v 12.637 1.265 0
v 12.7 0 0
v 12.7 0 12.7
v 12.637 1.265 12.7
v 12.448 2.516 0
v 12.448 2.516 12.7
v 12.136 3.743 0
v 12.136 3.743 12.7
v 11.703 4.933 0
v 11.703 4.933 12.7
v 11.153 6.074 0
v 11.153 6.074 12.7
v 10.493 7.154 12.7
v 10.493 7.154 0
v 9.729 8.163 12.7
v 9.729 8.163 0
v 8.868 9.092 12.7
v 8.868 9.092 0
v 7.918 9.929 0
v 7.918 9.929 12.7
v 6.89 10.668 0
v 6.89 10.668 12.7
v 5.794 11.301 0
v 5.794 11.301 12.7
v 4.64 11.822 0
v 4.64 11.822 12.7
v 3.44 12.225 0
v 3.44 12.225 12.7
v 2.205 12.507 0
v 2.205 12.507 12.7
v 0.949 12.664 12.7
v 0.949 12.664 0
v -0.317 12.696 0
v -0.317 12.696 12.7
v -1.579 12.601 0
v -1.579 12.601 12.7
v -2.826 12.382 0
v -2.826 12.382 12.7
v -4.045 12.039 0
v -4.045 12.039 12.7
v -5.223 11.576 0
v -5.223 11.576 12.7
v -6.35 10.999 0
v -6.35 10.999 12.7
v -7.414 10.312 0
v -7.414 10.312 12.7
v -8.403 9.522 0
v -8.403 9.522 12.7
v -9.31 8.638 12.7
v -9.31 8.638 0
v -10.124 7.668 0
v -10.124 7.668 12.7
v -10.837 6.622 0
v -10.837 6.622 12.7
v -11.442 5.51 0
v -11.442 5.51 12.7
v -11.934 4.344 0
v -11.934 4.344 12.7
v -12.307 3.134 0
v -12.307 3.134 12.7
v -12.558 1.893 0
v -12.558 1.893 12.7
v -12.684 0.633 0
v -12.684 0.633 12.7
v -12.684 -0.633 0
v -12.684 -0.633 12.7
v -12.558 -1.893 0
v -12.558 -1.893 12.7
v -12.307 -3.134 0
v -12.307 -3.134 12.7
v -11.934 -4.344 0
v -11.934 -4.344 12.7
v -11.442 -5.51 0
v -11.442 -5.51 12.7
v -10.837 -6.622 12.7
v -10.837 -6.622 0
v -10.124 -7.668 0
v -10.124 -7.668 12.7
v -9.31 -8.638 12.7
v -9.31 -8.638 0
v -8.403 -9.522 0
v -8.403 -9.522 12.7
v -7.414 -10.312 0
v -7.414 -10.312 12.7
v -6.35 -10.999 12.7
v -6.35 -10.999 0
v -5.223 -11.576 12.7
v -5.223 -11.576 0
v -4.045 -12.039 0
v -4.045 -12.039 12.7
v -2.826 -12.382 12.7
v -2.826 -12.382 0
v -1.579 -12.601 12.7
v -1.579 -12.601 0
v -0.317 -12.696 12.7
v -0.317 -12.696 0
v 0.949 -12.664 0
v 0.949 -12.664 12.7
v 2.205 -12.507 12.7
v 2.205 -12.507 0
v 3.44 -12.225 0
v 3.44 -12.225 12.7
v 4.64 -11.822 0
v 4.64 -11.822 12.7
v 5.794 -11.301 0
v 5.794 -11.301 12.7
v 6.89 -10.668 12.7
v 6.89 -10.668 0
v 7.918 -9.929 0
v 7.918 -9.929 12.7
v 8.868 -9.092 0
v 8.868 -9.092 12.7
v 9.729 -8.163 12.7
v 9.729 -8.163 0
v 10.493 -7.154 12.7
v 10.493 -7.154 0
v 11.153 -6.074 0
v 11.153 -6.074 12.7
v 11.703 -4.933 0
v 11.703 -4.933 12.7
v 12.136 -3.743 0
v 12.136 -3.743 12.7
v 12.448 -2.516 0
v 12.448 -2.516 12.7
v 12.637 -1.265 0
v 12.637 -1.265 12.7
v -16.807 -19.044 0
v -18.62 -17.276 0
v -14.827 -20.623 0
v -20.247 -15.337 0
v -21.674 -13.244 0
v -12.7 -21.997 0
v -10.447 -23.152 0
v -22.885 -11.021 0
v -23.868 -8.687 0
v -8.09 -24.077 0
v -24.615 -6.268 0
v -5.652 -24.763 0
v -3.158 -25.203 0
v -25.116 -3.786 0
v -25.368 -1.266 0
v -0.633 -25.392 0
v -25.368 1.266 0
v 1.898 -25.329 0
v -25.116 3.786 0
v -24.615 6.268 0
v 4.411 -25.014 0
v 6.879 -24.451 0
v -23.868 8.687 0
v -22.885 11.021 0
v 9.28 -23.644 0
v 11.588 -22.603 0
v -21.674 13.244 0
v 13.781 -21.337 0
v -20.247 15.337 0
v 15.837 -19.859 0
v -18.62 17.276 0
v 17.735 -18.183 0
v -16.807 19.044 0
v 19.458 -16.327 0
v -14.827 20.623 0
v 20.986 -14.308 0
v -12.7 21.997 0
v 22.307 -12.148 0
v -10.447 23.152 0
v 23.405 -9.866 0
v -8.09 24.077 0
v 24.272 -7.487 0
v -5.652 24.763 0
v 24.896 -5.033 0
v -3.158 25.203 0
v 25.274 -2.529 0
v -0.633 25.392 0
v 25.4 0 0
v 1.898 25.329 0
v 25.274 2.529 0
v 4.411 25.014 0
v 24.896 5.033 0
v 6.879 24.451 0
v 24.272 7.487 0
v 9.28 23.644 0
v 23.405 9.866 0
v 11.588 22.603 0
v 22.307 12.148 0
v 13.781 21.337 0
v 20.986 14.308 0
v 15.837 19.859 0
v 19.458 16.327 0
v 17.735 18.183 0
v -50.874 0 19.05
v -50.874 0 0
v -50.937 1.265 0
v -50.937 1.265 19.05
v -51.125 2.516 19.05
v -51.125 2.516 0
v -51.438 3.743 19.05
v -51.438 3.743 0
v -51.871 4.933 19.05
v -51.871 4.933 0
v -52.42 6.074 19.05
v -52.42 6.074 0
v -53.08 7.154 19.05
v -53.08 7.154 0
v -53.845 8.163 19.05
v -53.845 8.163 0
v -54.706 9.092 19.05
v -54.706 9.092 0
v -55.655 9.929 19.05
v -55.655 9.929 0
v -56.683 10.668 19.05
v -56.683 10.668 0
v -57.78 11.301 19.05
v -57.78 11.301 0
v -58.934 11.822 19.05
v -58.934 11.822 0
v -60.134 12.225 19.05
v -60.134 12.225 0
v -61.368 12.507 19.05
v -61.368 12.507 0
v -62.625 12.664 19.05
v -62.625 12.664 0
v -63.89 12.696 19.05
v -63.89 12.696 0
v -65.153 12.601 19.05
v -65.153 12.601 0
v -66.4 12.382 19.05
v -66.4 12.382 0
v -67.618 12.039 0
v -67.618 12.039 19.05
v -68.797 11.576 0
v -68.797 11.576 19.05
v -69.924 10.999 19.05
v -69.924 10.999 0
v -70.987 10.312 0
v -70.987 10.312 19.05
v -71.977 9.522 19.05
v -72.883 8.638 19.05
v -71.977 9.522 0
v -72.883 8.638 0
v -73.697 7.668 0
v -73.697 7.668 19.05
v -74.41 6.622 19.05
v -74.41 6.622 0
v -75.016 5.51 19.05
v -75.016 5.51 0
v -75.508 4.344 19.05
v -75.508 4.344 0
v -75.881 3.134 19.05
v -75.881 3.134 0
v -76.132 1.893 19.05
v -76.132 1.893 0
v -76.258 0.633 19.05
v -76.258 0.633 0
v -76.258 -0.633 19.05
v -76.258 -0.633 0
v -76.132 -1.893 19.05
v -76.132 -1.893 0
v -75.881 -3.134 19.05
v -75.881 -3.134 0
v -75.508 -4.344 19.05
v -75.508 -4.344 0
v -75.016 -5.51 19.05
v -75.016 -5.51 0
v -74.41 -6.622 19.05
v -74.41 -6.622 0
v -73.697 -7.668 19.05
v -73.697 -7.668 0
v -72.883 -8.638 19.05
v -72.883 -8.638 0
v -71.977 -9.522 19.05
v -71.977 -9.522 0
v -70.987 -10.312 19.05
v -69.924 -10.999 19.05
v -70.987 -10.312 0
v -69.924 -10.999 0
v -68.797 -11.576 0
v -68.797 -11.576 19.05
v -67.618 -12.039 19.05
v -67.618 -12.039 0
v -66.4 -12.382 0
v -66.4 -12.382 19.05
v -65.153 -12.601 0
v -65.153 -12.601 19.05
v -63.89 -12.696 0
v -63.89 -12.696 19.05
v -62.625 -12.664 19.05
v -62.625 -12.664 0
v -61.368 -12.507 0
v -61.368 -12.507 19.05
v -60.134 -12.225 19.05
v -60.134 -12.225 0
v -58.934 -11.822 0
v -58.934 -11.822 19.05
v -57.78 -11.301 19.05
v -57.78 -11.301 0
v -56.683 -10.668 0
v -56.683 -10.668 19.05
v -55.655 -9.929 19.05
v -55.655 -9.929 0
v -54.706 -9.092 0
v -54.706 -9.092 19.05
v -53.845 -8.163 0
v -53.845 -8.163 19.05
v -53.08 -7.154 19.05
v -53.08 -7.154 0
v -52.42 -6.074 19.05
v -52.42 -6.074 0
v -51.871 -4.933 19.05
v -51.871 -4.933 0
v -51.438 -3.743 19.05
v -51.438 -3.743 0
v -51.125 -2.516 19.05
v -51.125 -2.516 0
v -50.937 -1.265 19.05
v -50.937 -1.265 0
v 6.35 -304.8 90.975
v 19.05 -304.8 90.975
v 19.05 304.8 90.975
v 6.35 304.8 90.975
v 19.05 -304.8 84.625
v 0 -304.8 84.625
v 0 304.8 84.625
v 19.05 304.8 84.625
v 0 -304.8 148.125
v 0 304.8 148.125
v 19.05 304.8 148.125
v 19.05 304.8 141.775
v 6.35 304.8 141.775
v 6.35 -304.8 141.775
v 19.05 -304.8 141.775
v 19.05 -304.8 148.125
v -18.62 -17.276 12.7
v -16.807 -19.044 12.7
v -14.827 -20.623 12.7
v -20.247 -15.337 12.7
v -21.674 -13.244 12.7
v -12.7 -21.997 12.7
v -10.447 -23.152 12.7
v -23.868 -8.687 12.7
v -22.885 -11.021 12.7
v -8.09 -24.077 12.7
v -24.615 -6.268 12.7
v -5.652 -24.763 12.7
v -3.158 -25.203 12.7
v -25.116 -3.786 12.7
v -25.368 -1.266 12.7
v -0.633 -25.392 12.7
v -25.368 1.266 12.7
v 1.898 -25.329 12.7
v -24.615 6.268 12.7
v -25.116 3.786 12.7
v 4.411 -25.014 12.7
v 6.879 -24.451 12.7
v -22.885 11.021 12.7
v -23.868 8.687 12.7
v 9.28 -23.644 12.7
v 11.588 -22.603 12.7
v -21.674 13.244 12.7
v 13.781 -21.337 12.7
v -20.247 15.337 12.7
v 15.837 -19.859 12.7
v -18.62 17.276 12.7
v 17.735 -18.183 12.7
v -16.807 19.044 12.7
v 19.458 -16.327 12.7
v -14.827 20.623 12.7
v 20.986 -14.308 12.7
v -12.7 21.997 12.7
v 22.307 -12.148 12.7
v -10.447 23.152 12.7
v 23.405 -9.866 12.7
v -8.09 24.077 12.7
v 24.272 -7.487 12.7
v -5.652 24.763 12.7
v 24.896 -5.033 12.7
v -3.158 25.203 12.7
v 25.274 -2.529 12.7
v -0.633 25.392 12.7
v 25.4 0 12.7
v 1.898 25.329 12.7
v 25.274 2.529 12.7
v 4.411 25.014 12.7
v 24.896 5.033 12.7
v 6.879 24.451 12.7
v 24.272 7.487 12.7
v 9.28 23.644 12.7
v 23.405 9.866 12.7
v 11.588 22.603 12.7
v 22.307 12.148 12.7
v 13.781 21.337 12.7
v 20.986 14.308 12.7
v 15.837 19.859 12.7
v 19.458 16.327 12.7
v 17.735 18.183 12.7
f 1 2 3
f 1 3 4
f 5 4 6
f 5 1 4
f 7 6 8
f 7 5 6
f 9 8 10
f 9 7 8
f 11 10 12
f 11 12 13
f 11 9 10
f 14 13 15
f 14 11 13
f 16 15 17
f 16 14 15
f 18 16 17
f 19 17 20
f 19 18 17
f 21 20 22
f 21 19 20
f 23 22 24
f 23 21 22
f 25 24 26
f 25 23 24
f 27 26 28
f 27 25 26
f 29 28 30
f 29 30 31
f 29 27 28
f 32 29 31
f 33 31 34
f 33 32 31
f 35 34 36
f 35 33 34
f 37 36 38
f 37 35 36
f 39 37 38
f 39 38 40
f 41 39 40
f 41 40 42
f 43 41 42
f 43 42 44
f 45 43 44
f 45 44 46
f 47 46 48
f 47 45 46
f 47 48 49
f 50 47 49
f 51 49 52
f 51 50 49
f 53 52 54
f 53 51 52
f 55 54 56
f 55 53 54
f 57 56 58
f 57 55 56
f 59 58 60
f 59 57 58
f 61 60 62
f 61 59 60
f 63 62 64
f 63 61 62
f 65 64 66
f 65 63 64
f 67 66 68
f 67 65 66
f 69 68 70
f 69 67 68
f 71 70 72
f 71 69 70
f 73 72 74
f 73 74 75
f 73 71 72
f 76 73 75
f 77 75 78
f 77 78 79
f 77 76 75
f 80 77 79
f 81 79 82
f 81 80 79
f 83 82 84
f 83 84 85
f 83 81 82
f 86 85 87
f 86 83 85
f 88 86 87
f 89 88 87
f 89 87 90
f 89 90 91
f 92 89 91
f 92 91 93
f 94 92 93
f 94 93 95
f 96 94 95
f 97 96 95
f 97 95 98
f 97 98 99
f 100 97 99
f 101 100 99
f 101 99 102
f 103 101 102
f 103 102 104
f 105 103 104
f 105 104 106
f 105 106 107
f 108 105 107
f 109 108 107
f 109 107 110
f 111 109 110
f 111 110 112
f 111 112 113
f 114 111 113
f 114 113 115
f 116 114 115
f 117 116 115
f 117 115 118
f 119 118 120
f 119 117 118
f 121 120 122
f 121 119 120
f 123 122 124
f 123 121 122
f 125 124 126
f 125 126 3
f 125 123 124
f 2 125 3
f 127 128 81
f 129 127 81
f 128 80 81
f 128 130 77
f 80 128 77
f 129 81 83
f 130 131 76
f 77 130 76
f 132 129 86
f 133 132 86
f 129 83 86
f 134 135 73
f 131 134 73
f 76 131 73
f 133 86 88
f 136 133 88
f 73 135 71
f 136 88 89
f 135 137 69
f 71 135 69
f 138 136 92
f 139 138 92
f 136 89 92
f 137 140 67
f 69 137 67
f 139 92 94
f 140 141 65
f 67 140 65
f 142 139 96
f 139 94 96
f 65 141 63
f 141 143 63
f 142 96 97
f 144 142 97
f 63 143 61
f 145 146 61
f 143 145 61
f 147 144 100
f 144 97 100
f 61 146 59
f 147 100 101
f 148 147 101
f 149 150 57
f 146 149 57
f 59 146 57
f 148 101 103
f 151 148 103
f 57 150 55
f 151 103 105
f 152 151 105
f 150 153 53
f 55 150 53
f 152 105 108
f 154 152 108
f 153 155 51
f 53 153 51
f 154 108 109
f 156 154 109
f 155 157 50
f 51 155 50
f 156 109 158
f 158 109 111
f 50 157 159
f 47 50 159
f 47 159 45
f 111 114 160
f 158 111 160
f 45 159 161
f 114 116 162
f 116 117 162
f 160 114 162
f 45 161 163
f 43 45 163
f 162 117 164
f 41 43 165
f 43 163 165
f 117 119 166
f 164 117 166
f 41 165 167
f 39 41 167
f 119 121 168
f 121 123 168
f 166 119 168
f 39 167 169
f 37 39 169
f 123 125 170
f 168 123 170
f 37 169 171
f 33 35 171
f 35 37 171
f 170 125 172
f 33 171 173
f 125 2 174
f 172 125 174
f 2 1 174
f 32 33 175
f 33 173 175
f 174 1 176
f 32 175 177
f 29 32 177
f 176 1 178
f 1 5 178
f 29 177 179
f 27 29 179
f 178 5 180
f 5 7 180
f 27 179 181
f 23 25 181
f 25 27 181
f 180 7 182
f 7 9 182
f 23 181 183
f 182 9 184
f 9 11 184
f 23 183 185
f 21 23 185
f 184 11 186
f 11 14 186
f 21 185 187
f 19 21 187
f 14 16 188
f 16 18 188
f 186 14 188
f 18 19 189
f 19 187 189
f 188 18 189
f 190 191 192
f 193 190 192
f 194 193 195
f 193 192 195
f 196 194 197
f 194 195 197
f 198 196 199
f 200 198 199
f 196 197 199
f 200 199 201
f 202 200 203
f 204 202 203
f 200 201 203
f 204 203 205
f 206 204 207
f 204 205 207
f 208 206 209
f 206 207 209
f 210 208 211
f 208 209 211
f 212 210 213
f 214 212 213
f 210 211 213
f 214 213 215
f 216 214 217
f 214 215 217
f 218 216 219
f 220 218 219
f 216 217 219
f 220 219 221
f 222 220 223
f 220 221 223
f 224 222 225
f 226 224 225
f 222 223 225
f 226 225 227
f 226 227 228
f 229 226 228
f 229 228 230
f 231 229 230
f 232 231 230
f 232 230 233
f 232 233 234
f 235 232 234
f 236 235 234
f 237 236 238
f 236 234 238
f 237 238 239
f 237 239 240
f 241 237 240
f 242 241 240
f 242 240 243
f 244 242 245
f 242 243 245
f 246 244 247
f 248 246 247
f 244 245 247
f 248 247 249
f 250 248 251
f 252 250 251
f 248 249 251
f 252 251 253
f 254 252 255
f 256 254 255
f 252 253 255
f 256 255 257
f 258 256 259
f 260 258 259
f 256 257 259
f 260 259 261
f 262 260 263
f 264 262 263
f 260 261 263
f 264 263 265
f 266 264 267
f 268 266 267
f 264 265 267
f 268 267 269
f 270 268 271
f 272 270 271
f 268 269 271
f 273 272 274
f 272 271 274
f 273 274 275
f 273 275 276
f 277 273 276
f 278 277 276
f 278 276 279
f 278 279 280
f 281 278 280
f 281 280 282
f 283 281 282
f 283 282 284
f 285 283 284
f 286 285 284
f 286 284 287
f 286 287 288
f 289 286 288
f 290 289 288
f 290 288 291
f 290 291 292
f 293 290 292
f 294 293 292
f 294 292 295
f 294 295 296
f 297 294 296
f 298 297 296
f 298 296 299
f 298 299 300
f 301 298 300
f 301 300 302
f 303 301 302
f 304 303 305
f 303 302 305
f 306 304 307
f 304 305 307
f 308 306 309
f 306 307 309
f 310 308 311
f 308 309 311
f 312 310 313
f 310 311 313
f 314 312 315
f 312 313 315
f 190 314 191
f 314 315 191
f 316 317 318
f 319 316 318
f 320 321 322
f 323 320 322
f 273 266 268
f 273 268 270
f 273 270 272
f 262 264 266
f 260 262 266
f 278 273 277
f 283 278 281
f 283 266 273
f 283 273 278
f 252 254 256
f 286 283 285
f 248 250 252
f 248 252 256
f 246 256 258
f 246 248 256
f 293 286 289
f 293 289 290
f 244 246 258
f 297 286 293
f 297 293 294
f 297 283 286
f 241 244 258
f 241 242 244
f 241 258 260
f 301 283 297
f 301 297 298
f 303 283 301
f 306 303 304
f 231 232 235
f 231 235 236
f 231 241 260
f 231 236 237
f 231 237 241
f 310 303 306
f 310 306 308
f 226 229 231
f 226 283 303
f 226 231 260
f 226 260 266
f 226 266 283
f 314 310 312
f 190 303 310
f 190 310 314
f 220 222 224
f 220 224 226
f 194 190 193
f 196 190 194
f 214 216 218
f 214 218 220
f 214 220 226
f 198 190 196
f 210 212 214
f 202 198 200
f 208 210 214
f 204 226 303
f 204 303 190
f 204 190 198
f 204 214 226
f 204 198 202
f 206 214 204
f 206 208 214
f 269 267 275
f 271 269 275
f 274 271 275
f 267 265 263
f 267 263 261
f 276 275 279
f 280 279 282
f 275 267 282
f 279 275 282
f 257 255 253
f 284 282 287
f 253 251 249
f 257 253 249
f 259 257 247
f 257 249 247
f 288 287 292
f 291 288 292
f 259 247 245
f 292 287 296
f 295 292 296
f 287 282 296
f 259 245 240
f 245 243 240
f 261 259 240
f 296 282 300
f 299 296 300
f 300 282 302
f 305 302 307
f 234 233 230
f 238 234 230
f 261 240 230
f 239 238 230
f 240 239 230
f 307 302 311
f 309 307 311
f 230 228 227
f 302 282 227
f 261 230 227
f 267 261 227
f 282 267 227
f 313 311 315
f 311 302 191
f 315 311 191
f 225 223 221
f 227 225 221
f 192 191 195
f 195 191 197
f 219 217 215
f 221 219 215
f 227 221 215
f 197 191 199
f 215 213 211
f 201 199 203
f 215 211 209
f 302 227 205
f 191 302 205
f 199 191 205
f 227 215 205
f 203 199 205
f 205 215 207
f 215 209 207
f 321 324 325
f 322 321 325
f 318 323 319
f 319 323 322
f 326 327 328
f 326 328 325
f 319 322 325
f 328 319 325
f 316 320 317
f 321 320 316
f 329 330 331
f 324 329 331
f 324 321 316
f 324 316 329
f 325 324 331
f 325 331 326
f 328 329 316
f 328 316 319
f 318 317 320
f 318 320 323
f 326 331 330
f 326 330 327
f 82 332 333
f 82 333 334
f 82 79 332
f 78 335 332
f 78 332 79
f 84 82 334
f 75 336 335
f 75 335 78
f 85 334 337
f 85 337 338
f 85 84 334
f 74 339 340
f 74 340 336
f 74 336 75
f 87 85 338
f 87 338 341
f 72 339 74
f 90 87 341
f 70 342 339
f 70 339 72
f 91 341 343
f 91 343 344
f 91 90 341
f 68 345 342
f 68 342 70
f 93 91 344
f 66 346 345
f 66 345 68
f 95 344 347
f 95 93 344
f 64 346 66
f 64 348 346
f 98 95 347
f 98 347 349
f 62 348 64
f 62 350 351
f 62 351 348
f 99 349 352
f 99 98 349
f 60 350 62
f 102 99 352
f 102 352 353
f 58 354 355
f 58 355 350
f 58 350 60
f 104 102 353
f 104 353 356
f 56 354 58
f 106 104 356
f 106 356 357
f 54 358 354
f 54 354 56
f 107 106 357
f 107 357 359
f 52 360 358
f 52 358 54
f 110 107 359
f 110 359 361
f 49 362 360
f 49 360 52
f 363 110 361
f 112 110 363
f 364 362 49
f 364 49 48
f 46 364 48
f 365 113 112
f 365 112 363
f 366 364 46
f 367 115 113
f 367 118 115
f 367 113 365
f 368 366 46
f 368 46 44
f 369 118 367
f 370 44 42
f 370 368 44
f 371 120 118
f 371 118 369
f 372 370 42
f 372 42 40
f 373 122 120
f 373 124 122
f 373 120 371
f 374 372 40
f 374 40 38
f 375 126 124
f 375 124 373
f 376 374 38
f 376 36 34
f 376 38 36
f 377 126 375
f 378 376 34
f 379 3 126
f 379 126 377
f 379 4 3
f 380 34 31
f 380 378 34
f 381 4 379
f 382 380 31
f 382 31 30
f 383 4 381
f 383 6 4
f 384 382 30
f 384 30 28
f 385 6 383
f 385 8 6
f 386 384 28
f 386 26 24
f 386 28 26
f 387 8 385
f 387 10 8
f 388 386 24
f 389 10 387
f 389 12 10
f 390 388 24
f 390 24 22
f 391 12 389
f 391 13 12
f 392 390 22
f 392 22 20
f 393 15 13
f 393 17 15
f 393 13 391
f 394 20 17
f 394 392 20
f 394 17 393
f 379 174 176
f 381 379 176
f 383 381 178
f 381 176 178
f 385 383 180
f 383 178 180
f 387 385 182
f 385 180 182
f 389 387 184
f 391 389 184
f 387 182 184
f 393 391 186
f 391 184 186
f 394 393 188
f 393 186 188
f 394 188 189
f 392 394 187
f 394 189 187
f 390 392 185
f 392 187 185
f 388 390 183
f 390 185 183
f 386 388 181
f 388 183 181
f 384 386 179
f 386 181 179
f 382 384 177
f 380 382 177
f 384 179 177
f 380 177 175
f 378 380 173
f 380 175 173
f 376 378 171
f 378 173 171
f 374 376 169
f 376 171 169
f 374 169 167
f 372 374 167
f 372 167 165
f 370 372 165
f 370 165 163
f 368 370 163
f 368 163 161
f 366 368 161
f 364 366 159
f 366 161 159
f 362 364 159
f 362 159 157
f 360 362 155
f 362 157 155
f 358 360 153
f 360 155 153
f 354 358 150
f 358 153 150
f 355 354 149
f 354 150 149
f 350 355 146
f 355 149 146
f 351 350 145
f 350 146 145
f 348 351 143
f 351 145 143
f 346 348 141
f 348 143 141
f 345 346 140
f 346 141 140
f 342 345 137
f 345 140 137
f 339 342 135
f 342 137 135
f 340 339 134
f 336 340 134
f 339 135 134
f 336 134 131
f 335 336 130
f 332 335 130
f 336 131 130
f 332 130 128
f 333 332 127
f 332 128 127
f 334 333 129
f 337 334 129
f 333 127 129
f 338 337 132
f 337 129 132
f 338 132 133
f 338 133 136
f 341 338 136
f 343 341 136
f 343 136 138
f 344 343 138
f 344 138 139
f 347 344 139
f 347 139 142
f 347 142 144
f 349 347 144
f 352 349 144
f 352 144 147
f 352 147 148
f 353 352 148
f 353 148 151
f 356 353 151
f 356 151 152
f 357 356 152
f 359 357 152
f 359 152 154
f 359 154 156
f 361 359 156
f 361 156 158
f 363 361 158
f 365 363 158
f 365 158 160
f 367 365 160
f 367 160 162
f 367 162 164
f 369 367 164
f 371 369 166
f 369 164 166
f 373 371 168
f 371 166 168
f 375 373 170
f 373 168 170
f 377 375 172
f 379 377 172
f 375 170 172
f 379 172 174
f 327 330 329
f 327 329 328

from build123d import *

# Parameters (mm, degrees)
F0_R     = 25.4
F0_R_2   = 12.7
F1_DEPTH = 12.7
F2_R     = 12.7
F3_DEPTH = 19.05
F4_W     = 609.6
F4_H     = 63.5
F5_DEPTH = 19.05
F6_W     = 609.6
F6_H     = 50.8
F7_DEPTH = 12.7


with BuildPart() as f1:
    # F0 (on Top) → F1 (new body)
    with BuildSketch(Plane.XY):
        Circle(F0_R)
        Circle(F0_R_2, mode=Mode.SUBTRACT)
    extrude(amount=F1_DEPTH)


with BuildPart() as f3:
    # F2 (on Top) → F3 (new body)
    with BuildSketch(Plane.XY):
        with Locations((-63.573614, 0)):
            Circle(F2_R)
    extrude(amount=F3_DEPTH)


with BuildPart() as f5:
    # F4 (on Right) → F5 (new body)
    with BuildSketch(Plane.YZ):
        with Locations((0, 116.374905)):
            Rectangle(F4_W, F4_H)
    extrude(amount=F5_DEPTH)

    # F6 (on face) → F7 (cut)
    with BuildSketch(Plane.YZ.offset(19.05)):
        with Locations((0, 116.374905)):
            Rectangle(F6_W, F6_H)
    extrude(amount=-F7_DEPTH, mode=Mode.SUBTRACT)


solid = Compound([f1.part, f3.part, f5.part])
